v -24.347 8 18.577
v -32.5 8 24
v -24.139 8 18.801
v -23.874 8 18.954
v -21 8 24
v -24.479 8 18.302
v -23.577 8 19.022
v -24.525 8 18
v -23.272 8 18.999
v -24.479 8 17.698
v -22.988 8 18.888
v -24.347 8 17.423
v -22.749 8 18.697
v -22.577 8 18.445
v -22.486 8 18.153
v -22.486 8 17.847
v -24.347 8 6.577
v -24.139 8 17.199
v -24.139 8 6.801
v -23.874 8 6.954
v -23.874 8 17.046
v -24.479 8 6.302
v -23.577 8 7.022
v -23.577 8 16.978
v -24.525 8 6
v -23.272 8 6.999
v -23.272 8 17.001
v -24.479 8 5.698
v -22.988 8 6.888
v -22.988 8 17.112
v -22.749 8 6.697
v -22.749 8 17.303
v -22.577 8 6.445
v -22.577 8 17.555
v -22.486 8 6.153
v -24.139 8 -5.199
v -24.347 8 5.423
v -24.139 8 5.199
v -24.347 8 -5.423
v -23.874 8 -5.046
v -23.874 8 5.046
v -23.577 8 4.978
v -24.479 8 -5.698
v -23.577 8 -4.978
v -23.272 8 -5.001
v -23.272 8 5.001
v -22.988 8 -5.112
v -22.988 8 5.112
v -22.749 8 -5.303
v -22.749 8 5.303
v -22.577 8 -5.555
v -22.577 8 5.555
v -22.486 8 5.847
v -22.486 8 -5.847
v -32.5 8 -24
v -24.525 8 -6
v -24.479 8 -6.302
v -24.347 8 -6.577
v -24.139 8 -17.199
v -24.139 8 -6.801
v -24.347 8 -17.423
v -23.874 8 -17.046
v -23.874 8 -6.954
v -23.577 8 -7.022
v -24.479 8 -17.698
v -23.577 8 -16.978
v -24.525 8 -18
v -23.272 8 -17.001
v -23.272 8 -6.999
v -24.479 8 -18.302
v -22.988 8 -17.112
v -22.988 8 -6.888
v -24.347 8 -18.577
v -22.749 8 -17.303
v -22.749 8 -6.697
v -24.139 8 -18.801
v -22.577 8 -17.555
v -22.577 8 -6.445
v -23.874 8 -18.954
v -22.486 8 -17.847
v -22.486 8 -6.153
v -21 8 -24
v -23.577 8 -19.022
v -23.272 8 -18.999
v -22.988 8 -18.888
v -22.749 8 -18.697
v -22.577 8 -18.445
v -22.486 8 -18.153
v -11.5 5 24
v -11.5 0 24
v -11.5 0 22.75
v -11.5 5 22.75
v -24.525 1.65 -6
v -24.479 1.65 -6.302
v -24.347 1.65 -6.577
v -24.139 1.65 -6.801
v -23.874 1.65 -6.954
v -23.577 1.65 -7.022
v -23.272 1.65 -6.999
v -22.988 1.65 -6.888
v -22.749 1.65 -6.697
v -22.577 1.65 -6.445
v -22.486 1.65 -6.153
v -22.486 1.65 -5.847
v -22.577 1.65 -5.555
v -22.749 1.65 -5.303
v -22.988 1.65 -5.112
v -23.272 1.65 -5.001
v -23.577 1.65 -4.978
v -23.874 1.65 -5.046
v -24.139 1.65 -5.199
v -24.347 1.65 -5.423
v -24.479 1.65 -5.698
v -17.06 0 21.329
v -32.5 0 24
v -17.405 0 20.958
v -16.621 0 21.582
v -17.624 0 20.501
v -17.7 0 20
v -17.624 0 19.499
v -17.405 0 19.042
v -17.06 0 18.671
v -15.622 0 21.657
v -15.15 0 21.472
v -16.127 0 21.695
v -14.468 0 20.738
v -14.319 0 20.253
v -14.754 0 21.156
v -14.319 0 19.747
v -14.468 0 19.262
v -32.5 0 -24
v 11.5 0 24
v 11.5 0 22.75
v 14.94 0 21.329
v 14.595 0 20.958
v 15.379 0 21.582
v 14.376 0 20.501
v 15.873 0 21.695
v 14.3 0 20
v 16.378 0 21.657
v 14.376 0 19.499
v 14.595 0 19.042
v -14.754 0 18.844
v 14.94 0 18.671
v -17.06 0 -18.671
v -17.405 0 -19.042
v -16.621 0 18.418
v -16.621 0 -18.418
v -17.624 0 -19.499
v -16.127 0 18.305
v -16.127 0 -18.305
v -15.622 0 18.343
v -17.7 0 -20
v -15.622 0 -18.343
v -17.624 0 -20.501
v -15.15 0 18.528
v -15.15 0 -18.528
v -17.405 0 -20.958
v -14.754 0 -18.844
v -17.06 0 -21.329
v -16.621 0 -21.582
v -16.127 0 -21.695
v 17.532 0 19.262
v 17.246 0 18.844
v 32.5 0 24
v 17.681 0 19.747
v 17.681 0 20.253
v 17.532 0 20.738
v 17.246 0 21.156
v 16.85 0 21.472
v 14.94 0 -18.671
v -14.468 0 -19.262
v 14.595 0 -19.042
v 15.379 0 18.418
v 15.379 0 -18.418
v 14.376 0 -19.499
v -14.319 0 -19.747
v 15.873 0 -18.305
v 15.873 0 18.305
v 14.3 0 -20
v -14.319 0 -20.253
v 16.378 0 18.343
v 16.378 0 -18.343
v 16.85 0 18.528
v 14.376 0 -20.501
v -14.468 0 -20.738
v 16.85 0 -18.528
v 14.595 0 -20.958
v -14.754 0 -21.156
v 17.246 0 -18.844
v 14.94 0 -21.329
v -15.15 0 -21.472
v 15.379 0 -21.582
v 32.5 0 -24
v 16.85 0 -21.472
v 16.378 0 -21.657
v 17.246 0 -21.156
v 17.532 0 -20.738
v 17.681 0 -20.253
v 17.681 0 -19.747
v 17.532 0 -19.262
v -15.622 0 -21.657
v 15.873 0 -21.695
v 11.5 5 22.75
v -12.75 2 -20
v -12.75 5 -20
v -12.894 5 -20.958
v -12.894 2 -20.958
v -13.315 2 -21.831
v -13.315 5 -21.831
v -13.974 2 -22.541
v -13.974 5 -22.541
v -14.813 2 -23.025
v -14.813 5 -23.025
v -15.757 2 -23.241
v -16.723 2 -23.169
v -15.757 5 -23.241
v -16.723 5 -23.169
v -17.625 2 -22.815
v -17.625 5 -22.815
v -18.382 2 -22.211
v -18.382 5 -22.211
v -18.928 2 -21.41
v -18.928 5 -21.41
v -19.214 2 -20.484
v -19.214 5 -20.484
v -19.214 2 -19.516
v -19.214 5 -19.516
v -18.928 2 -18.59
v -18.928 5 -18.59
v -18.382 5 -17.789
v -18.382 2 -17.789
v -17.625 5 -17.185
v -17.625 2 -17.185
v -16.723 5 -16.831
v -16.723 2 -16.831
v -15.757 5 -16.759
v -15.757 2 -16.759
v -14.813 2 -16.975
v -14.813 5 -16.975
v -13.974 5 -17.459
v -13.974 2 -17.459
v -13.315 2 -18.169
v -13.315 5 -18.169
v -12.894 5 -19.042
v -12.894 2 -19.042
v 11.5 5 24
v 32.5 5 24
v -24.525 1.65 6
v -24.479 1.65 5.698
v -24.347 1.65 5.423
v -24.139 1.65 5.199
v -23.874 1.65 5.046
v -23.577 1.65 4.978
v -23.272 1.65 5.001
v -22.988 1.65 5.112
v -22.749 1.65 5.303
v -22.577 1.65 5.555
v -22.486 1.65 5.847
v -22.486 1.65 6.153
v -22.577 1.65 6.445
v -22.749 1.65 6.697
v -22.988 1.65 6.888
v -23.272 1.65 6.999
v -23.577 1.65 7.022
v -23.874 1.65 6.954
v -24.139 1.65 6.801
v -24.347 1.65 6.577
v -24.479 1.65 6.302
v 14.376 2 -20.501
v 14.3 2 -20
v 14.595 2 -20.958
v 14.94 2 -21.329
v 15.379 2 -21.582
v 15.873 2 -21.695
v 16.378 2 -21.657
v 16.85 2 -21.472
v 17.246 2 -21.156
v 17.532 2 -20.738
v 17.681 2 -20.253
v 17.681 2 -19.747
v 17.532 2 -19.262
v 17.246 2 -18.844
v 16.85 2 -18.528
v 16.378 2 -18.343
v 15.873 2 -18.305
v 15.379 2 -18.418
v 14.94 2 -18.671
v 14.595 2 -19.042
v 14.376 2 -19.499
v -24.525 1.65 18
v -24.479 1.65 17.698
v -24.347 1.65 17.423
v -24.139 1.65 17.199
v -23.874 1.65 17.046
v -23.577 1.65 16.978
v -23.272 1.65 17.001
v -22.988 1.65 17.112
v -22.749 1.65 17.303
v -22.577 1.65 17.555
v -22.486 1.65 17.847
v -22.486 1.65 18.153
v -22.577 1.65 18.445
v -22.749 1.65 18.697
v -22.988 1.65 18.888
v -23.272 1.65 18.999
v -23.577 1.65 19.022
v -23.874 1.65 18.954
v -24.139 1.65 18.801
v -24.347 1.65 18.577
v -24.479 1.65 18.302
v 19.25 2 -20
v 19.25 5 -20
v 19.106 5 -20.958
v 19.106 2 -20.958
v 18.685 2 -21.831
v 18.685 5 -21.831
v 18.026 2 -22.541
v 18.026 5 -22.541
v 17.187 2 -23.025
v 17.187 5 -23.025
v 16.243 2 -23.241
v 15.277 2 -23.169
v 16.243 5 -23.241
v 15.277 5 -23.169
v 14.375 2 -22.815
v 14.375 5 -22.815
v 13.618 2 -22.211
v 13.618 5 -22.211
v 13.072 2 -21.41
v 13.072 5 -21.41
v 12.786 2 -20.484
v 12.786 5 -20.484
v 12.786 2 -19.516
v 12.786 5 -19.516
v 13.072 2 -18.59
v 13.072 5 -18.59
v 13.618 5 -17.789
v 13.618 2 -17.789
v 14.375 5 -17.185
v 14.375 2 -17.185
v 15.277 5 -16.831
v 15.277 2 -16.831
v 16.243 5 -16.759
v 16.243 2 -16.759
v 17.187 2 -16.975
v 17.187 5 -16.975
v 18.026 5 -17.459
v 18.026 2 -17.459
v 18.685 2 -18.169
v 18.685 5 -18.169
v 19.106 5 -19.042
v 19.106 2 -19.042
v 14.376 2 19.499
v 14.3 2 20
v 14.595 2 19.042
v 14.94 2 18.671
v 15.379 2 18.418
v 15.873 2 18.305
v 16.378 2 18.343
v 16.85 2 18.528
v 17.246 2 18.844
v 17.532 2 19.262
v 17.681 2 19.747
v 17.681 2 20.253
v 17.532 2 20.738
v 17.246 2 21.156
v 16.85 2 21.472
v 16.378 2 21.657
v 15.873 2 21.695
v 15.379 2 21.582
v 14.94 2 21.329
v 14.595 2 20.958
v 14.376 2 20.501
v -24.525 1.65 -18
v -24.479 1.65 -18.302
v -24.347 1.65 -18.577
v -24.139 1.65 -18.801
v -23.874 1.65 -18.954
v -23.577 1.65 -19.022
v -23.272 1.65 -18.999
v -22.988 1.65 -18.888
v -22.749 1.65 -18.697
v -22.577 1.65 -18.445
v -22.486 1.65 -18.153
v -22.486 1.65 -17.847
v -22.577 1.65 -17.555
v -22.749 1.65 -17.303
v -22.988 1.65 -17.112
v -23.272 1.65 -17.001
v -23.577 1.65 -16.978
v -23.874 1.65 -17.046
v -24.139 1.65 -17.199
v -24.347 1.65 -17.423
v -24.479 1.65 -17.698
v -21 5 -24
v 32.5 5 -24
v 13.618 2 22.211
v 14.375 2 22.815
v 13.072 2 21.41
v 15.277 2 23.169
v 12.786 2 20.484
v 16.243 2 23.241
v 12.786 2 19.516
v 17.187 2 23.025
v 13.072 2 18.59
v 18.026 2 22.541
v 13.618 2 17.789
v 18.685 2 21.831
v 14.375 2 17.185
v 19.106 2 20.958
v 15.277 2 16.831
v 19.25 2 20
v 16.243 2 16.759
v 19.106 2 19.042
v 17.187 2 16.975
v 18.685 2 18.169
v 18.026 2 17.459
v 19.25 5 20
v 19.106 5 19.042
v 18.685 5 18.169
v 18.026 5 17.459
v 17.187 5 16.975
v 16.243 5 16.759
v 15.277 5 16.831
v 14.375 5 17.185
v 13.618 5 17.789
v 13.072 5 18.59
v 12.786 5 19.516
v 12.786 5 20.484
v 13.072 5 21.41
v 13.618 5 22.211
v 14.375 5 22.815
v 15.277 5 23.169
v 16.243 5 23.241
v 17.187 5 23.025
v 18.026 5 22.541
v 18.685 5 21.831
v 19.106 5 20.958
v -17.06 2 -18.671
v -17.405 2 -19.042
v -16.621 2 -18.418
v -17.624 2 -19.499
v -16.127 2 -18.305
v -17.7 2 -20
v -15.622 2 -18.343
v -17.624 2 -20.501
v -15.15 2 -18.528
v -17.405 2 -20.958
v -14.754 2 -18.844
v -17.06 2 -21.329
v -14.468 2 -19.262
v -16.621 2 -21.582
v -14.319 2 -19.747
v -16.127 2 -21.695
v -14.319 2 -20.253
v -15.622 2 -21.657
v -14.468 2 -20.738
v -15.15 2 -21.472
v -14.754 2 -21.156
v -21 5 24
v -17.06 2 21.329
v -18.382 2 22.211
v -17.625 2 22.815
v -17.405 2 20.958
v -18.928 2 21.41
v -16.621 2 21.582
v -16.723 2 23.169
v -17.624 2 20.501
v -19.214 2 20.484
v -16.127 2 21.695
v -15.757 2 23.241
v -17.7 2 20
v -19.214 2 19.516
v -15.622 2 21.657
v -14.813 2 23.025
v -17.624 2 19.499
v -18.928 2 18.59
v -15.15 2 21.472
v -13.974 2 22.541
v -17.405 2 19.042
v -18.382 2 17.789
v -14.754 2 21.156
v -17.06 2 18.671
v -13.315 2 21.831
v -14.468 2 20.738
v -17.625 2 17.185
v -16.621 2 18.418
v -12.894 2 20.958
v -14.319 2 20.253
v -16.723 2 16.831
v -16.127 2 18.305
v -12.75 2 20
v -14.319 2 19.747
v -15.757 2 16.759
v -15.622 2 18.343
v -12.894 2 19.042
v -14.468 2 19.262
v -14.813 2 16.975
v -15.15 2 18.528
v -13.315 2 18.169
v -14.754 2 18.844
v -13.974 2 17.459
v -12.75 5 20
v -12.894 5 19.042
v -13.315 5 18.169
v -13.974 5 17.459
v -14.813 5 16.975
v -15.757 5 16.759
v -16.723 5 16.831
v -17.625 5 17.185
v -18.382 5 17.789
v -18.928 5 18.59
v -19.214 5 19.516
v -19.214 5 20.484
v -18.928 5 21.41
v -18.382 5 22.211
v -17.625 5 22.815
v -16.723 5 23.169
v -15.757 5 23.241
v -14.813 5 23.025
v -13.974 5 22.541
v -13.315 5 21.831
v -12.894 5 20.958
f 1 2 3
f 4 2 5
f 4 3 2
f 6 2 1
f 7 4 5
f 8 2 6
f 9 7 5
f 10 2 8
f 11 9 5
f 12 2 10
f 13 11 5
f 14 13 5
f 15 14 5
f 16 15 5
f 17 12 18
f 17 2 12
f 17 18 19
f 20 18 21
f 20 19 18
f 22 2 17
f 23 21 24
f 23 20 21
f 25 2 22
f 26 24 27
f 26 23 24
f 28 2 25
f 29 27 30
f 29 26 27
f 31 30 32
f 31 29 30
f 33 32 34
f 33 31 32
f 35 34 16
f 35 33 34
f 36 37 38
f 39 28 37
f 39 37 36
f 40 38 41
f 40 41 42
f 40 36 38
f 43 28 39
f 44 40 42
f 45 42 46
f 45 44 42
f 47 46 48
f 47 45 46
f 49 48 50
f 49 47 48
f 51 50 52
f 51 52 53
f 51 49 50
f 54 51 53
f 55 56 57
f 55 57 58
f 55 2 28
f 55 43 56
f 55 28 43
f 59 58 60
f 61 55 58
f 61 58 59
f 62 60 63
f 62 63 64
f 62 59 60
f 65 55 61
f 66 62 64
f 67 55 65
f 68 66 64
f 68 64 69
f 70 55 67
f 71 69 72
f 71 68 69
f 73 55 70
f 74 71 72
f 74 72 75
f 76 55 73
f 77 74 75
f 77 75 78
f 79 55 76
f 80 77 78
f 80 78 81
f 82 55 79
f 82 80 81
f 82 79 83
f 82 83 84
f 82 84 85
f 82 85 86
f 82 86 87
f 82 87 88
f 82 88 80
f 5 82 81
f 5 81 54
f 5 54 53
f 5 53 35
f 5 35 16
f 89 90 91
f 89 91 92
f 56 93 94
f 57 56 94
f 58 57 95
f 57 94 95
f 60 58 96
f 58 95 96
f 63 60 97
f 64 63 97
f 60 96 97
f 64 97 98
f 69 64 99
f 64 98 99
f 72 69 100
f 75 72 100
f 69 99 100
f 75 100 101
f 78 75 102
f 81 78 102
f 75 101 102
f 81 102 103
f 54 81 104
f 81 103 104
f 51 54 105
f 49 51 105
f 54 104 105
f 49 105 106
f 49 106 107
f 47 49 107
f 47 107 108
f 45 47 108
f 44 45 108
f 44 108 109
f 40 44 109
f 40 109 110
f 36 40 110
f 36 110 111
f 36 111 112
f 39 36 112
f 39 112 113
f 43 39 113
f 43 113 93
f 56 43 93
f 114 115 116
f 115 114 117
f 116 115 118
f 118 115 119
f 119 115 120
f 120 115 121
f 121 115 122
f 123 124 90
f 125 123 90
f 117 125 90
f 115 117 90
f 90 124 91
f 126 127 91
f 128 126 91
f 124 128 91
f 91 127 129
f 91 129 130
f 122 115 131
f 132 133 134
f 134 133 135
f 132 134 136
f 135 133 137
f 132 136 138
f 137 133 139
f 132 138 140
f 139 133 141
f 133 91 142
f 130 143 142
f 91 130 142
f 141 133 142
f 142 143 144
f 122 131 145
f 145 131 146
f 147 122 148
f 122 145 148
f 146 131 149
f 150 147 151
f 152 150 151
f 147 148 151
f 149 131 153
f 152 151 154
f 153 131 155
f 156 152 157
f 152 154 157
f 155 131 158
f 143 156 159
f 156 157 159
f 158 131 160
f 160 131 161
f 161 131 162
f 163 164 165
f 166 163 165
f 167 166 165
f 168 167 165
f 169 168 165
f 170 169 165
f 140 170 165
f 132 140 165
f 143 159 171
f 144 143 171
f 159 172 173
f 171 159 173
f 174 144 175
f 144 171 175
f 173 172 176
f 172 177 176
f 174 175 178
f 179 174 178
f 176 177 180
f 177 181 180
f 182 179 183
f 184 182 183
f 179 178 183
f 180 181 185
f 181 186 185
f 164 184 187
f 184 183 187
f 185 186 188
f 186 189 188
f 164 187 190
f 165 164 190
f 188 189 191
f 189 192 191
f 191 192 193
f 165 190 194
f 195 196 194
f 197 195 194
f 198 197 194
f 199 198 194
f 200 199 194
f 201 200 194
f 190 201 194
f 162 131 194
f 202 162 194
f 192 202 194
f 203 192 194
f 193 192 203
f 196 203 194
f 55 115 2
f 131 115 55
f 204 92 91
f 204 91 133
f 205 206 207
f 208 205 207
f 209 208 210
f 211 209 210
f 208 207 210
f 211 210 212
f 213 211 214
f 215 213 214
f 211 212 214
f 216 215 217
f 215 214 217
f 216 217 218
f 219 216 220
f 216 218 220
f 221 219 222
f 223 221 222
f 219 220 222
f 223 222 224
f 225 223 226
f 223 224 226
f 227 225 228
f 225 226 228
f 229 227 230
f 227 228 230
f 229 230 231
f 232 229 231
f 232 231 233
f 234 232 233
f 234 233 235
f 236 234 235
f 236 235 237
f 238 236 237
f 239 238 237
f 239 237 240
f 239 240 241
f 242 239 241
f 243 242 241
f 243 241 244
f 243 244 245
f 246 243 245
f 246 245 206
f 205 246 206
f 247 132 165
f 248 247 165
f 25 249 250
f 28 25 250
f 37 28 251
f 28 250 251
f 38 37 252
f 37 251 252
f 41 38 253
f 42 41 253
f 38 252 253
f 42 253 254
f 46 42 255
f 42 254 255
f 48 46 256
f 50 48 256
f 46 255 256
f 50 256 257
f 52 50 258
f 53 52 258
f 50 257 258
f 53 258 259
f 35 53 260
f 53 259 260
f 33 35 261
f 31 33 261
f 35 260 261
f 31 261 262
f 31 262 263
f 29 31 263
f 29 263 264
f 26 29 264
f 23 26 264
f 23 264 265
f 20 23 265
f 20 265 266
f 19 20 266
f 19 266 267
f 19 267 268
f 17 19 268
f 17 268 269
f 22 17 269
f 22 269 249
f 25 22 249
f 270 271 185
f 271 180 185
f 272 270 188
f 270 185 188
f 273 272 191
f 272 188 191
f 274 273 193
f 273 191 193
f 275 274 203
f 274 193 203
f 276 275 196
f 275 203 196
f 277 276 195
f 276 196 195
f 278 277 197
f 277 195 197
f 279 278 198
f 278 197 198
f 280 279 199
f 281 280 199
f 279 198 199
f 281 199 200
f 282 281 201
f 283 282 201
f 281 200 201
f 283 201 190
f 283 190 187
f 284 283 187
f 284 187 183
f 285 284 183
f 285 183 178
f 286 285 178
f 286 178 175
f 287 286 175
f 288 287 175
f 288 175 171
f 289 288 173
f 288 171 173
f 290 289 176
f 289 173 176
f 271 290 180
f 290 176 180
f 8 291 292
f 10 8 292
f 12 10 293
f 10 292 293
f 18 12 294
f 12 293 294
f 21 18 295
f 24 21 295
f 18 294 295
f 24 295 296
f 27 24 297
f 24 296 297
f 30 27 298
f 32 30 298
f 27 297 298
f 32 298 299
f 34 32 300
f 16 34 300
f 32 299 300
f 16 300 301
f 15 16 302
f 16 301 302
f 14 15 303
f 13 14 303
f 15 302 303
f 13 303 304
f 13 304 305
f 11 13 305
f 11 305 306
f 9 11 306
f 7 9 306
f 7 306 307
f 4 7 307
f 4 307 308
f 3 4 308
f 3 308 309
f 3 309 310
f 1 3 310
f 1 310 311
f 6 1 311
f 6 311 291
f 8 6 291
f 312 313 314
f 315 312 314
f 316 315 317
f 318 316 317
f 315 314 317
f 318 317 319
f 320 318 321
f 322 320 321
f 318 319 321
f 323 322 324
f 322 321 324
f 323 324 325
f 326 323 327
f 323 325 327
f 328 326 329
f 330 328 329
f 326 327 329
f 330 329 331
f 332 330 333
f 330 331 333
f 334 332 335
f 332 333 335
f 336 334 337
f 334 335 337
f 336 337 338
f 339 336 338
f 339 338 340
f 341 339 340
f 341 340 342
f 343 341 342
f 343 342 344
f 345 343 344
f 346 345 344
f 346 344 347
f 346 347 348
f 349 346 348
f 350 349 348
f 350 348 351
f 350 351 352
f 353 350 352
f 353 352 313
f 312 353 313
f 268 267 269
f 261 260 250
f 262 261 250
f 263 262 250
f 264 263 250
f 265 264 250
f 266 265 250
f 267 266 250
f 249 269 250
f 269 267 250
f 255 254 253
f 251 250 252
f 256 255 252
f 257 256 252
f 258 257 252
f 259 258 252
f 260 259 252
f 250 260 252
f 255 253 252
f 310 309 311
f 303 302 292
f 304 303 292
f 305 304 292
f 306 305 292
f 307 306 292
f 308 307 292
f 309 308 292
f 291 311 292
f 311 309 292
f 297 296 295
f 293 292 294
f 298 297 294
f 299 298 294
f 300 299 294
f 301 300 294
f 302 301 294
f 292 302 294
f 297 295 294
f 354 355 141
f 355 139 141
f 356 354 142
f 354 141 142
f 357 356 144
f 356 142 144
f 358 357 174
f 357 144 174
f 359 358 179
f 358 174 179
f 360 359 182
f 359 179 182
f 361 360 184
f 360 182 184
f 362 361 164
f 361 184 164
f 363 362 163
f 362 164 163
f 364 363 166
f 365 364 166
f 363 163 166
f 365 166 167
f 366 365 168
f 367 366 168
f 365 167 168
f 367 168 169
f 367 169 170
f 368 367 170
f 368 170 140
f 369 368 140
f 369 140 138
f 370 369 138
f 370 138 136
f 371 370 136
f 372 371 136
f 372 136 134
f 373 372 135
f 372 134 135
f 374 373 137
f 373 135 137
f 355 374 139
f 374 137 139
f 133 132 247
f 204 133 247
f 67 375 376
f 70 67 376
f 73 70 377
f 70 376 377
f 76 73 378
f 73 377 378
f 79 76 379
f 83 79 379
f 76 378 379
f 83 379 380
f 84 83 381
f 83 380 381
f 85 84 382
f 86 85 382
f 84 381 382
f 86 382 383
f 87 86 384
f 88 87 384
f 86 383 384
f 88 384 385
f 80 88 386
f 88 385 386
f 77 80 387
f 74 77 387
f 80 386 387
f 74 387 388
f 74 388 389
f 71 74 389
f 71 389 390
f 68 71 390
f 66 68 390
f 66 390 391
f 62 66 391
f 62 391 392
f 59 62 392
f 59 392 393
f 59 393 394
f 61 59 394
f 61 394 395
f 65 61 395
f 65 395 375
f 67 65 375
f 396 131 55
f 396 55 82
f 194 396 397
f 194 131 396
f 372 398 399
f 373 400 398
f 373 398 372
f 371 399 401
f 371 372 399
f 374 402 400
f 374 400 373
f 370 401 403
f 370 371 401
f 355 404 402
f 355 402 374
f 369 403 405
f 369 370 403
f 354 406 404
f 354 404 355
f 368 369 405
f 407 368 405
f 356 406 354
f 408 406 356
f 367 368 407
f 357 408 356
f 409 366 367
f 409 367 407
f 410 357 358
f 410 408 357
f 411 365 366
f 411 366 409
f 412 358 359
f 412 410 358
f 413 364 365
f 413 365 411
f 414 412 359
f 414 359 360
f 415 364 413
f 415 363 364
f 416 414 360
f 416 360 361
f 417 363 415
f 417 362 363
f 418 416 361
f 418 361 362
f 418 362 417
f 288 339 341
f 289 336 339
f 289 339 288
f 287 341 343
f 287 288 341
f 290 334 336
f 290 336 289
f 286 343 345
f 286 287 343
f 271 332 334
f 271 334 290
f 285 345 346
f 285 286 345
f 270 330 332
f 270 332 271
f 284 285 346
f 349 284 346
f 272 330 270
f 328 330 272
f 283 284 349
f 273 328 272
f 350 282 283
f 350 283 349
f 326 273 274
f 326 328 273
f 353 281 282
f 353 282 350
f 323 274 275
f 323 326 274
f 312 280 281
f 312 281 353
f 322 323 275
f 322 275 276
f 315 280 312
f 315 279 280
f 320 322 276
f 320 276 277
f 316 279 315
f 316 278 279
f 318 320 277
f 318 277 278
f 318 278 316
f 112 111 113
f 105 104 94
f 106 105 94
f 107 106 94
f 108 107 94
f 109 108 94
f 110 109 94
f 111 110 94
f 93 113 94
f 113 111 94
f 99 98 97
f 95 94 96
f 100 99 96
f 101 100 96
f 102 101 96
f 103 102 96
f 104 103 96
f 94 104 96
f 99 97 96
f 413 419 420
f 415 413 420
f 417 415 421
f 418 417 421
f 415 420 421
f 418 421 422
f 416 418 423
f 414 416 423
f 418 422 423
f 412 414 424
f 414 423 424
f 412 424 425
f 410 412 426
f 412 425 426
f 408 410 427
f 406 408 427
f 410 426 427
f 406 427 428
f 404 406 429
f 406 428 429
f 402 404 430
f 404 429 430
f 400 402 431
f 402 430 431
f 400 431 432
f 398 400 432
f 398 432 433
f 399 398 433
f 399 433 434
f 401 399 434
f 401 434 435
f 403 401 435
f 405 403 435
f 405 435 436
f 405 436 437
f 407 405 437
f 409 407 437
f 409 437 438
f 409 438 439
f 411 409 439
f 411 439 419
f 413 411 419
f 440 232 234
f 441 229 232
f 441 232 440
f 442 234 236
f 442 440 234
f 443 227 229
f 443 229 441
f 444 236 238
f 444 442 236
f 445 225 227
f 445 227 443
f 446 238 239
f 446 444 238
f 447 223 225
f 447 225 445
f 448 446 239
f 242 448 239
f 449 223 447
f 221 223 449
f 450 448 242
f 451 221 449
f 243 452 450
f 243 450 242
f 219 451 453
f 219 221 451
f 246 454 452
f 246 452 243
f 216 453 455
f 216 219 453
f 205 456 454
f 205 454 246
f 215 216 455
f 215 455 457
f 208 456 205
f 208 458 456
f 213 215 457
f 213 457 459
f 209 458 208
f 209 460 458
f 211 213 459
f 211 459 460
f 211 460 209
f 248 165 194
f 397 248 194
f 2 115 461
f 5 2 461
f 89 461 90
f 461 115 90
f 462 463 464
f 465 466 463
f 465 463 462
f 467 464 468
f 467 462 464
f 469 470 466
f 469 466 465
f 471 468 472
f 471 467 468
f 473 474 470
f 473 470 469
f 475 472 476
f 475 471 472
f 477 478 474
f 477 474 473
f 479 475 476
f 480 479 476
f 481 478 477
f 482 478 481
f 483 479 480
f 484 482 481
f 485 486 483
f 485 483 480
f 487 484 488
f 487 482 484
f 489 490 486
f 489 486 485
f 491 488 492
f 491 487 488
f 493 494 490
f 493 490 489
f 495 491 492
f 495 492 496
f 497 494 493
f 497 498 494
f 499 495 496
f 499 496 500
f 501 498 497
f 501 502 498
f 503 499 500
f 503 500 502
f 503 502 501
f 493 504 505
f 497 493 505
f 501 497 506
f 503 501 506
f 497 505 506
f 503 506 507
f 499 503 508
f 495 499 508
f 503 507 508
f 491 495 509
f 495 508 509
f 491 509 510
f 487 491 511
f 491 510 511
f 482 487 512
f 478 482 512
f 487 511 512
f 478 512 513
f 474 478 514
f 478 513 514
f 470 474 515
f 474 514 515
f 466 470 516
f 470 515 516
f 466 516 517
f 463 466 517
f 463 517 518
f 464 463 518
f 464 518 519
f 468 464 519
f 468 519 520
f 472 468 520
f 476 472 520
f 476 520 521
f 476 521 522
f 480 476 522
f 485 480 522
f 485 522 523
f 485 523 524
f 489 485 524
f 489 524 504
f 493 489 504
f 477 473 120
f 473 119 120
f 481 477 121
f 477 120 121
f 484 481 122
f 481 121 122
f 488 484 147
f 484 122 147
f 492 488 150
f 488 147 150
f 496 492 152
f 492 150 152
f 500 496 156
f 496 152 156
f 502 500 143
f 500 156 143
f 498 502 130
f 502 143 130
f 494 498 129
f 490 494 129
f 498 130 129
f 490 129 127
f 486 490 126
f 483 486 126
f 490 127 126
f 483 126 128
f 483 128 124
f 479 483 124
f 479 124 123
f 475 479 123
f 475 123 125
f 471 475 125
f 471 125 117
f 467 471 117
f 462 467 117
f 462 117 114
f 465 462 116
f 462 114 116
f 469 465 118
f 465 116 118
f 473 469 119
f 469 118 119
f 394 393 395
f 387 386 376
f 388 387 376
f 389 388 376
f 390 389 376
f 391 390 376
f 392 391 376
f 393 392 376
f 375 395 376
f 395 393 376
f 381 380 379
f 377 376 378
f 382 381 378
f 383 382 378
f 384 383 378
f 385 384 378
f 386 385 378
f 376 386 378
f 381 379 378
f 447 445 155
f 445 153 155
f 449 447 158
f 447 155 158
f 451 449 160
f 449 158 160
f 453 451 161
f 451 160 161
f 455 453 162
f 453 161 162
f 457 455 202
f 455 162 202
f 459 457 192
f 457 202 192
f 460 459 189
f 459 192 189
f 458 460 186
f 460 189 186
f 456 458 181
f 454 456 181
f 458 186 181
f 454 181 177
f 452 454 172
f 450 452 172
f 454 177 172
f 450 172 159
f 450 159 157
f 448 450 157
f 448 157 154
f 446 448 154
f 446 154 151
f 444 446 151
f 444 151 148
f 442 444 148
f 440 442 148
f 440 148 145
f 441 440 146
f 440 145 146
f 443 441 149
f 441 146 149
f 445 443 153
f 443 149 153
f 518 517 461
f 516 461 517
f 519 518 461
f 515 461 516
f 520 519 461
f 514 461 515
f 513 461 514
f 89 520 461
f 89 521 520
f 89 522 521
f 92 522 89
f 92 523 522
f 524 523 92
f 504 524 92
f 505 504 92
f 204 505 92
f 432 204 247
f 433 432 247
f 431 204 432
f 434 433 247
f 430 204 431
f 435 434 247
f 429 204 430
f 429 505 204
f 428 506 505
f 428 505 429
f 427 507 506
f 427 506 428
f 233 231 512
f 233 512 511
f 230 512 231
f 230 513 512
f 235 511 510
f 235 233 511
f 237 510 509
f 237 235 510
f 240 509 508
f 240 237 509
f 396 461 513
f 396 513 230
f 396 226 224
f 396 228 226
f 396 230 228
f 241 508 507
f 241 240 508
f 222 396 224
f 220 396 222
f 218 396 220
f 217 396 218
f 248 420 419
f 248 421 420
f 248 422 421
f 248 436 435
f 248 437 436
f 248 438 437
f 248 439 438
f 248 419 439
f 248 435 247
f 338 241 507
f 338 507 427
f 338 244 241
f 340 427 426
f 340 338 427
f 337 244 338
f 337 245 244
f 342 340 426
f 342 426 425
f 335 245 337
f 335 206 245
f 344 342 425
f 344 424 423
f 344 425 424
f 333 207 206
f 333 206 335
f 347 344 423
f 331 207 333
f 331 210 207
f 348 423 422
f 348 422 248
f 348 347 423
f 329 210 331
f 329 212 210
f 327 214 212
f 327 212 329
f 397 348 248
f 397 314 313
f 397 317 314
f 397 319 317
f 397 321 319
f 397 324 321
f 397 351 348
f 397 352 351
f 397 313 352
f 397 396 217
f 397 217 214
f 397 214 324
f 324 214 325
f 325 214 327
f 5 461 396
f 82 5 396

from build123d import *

# Parameters (mm, degrees)
SKETCH1_W                      = 65
SKETCH1_H                      = 48
BOSS_EXTRUDE1_DEPTH            = 5
SKETCH2_W                      = 11.5
SKETCH2_H                      = 48
BOSS_EXTRUDE2_DEPTH            = 3
M2_5X0_45_TAPPED_HOLE1_D       = 2.05
M2_5X0_45_TAPPED_HOLE1_DEPTH   = 6.35
CBORE_FOR_M3_SHCS1_D           = 3.4
CBORE_FOR_M3_SHCS1_CBORE_D     = 6.5
CBORE_FOR_M3_SHCS1_CBORE_DEPTH = 3
SKETCH7_W                      = 23
SKETCH7_H                      = 5
CUT_EXTRUDE1_DEPTH             = 1.25


with BuildPart() as part:
    # Sketch1 → Boss-Extrude1 (new body)
    with BuildSketch(Plane(origin=(0, 0, 0), x_dir=(1, 0, 0), z_dir=(0, 1, 0))):
        Rectangle(SKETCH1_W, SKETCH1_H)
    extrude(amount=BOSS_EXTRUDE1_DEPTH)

    # Sketch2 → Boss-Extrude2 (add)
    with BuildSketch(Plane(origin=(0, 5, 0), x_dir=(1, 0, 0), z_dir=(0, 1, 0))):
        with Locations((-26.75, 0)):
            Rectangle(SKETCH2_W, SKETCH2_H)
    extrude(amount=BOSS_EXTRUDE2_DEPTH)

    # M2.5x0.45 Tapped Hole1
    with Locations(Plane(origin=(0, 8, 0), x_dir=(1, 0, 0), z_dir=(0, 1, 0))):
        with Locations((-23.5, 18), (-23.5, 6), (-23.5, -18), (-23.5, -6)):
            Hole(M2_5X0_45_TAPPED_HOLE1_D / 2, depth=M2_5X0_45_TAPPED_HOLE1_DEPTH)

    # CBORE for M3 SHCS1 (through all)
    with Locations(Plane(origin=(0, 5, 0), x_dir=(1, 0, 0), z_dir=(0, 1, 0))):
        with Locations((-16, 20), (16, 20), (-16, -20), (16, -20)):
            CounterBoreHole(CBORE_FOR_M3_SHCS1_D / 2, CBORE_FOR_M3_SHCS1_CBORE_D / 2, CBORE_FOR_M3_SHCS1_CBORE_DEPTH)

    # Sketch7 → Cut-Extrude1 (cut)
    with BuildSketch(Plane.XY.offset(24)):
        with Locations((0, 2.5)):
            Rectangle(SKETCH7_W, SKETCH7_H)
    extrude(amount=-CUT_EXTRUDE1_DEPTH, mode=Mode.SUBTRACT)


solid = part.part
